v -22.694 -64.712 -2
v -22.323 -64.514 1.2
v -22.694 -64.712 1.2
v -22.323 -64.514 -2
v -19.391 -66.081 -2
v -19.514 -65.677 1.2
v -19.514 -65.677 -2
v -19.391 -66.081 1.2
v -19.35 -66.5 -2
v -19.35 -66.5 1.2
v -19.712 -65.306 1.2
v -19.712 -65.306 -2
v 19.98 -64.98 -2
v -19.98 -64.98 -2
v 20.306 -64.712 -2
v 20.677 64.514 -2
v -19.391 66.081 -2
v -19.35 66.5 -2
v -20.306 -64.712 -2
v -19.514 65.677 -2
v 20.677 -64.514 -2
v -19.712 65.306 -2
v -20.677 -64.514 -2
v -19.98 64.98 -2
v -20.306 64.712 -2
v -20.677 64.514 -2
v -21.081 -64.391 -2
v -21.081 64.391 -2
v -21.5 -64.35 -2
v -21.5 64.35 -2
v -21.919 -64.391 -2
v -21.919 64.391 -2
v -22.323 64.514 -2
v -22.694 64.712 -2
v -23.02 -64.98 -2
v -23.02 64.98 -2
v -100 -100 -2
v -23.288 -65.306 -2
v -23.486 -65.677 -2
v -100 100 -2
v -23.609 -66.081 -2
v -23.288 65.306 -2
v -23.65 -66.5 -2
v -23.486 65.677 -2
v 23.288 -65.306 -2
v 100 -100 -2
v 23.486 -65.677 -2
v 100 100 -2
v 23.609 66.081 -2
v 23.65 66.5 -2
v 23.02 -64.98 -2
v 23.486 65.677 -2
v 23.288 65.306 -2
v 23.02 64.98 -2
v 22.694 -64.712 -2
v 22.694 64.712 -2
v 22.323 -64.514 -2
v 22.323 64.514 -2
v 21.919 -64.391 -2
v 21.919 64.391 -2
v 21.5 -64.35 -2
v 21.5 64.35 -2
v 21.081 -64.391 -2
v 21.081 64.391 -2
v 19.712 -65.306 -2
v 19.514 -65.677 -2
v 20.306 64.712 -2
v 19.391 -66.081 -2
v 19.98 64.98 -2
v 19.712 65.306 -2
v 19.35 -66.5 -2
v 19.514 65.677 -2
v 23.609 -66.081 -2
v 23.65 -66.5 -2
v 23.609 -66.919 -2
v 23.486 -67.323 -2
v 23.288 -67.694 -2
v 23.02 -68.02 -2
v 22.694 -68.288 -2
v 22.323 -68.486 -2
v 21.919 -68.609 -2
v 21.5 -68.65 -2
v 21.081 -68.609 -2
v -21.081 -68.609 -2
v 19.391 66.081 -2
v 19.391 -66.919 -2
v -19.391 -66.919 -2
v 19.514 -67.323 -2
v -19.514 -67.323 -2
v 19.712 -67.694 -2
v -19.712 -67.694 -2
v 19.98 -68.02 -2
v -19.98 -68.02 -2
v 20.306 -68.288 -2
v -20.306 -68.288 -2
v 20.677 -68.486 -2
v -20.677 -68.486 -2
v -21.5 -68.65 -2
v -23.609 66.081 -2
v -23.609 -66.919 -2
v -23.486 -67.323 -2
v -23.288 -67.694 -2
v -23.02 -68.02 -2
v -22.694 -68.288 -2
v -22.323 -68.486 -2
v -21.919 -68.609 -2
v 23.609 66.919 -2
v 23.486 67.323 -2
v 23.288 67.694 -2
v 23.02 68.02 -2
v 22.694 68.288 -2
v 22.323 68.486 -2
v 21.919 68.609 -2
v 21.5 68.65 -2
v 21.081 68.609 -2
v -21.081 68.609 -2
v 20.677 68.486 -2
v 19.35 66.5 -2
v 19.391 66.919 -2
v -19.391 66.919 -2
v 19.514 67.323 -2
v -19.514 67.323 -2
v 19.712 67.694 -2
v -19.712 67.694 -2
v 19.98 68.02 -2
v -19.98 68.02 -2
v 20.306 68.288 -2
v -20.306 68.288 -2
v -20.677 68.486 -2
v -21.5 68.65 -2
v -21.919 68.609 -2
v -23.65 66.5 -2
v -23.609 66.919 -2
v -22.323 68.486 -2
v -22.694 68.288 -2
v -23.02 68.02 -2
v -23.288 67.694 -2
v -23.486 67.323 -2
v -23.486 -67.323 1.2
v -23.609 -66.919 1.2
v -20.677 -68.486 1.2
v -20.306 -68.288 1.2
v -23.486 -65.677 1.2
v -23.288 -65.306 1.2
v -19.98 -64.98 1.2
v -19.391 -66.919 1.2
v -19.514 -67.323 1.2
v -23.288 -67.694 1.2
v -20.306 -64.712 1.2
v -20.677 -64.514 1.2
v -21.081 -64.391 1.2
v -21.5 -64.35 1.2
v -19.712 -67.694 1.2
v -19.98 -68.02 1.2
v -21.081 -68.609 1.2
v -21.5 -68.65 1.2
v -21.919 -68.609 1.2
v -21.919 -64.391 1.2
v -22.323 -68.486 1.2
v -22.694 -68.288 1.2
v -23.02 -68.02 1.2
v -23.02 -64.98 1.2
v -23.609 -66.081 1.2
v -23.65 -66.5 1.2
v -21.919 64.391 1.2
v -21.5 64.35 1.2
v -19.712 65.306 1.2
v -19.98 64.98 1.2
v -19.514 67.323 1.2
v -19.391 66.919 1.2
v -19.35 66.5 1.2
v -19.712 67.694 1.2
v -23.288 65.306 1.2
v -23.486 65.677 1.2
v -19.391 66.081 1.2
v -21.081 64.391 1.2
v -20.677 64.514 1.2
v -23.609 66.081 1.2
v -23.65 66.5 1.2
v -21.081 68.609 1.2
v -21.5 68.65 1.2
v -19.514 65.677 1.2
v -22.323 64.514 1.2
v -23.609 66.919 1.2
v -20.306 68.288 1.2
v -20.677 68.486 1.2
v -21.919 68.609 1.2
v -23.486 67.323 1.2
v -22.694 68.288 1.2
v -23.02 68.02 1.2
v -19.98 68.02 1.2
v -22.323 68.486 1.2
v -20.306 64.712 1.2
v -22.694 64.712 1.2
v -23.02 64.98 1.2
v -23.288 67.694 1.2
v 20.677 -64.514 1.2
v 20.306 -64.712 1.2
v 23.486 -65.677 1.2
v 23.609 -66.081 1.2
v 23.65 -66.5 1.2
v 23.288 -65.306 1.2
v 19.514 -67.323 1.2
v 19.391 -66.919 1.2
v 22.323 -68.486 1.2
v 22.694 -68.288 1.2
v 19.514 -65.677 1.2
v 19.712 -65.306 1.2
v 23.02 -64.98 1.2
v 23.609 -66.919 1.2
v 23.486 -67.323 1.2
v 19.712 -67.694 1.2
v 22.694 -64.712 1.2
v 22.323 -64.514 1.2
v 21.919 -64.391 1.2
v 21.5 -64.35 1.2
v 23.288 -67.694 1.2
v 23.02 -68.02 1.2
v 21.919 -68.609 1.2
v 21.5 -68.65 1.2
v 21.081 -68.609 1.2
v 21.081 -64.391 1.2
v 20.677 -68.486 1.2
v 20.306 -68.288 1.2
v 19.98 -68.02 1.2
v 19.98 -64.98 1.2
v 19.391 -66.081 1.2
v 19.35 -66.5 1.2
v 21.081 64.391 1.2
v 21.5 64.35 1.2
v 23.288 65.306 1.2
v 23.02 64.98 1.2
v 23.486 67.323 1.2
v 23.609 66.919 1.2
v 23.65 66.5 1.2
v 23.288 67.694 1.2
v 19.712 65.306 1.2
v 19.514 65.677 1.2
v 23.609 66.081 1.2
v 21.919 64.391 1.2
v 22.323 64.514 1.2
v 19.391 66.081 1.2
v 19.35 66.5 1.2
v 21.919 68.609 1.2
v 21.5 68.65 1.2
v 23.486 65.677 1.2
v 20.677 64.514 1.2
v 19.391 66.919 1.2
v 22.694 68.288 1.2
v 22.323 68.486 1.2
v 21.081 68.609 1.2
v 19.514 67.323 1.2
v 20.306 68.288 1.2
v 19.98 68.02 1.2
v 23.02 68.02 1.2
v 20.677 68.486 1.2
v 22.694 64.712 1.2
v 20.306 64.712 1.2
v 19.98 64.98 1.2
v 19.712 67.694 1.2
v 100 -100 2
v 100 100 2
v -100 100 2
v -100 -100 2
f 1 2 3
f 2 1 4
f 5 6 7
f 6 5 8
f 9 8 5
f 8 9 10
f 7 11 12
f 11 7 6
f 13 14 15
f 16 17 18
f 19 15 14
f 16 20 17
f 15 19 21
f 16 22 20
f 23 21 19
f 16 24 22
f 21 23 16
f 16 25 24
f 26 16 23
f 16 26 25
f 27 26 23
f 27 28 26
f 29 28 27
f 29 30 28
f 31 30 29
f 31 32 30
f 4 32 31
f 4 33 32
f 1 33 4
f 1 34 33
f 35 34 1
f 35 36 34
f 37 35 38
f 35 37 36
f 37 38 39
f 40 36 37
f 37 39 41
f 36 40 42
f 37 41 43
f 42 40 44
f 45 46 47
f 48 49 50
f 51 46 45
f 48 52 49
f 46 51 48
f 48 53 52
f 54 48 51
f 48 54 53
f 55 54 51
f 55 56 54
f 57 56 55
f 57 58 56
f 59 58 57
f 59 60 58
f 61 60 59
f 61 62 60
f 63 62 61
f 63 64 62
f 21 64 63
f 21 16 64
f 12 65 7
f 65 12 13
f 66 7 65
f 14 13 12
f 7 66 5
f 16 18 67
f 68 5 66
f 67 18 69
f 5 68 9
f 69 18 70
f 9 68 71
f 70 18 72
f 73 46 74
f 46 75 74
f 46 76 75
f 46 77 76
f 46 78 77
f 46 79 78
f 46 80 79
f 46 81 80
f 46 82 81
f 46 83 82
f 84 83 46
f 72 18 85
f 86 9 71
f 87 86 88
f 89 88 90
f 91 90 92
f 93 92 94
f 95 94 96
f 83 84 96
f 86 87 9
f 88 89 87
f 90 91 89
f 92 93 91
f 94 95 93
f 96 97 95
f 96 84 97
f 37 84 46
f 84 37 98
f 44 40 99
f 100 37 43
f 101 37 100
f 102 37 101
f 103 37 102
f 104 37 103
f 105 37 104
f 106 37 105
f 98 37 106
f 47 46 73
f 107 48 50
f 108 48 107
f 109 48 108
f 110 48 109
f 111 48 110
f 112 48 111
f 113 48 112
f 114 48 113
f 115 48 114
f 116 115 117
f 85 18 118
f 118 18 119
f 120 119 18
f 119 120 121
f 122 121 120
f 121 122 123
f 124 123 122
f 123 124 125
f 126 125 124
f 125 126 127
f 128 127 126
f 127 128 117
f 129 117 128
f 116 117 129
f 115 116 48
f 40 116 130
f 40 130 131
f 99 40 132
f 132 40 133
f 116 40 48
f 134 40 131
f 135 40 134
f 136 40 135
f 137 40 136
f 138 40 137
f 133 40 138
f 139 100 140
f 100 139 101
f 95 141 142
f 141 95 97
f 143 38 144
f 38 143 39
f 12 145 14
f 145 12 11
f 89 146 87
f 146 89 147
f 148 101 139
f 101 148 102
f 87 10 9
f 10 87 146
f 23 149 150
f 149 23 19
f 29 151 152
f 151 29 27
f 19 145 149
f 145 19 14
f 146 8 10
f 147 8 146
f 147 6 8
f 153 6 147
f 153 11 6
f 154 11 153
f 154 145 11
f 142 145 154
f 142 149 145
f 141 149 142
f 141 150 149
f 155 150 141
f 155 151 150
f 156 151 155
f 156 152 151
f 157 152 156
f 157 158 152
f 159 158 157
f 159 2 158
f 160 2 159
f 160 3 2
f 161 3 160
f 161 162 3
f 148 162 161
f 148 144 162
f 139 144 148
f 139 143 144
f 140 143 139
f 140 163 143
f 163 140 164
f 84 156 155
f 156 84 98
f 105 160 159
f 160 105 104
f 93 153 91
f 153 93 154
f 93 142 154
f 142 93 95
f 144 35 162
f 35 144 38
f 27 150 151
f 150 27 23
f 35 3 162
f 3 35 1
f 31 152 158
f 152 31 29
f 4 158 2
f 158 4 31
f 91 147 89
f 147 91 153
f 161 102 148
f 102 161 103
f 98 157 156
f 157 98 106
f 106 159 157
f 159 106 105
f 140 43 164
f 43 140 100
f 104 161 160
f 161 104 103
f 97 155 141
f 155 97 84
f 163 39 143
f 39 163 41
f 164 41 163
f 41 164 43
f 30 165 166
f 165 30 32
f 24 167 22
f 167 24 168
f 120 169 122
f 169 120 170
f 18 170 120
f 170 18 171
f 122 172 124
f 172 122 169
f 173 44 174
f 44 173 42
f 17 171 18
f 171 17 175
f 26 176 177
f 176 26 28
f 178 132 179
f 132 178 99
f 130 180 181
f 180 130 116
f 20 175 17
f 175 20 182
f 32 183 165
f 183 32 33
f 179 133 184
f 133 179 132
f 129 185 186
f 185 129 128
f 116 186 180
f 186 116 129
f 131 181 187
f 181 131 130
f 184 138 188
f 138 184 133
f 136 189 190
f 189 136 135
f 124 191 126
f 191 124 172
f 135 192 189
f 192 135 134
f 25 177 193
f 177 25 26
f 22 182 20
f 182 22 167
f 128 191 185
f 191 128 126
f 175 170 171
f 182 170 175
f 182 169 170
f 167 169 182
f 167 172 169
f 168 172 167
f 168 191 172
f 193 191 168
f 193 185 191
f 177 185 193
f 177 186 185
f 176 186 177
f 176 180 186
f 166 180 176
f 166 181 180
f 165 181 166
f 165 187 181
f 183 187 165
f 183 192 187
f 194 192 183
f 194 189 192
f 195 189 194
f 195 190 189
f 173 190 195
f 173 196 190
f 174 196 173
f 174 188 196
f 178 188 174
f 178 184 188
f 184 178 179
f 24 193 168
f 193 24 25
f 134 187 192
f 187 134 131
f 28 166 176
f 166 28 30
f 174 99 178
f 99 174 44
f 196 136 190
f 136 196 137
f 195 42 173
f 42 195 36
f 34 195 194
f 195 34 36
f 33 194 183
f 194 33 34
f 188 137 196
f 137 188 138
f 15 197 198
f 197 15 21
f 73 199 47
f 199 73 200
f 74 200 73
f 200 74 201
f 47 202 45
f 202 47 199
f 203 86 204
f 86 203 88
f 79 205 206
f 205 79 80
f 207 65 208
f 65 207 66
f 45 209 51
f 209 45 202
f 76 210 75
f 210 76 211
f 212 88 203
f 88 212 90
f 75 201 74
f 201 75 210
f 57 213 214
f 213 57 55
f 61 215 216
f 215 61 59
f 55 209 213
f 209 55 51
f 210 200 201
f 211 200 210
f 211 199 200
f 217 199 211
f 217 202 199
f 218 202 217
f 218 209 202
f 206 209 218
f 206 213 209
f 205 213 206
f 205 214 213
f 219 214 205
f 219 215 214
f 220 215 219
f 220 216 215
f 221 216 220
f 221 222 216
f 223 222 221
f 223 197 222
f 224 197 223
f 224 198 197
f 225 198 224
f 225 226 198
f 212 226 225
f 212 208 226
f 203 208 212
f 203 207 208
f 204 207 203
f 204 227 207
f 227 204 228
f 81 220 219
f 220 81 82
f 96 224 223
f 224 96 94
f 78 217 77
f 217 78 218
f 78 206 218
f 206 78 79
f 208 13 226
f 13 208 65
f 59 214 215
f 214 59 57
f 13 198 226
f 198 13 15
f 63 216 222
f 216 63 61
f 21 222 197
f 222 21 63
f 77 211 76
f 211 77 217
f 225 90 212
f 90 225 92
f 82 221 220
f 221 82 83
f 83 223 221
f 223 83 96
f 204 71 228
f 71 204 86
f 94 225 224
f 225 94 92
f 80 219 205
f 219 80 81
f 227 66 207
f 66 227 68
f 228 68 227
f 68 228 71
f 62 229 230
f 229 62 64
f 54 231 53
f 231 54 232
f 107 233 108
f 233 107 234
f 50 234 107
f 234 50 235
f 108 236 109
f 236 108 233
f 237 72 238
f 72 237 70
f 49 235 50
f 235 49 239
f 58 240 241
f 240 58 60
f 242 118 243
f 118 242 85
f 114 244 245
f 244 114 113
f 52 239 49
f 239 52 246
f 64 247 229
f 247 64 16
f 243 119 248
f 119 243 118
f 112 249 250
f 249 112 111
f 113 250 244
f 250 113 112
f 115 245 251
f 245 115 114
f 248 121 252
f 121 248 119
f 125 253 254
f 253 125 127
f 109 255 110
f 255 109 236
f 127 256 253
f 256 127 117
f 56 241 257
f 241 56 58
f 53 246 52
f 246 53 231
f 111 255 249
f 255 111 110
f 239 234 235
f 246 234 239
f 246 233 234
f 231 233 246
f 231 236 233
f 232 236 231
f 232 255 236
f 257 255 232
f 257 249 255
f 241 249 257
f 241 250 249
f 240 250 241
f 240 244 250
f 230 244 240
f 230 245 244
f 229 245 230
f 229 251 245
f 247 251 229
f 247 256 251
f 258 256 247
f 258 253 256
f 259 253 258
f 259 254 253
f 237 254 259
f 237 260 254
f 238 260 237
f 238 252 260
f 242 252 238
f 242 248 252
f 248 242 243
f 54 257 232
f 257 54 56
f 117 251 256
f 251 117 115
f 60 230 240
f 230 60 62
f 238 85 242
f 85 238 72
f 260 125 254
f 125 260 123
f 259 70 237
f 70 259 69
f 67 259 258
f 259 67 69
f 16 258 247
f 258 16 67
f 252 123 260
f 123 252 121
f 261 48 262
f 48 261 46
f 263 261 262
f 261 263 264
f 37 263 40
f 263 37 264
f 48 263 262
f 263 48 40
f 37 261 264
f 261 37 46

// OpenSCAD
// file: params.scad
// ── Shared parameters for card track system ──────────────────────────────────

// 608ZZ skateboard bearing
bearing_od = 22;
bearing_id = 8;
bearing_w  = 7;

// Track section
track_sec_len = 200;   // length of one straight section
track_floor_t = 4;     // floor thickness

// Cart body width — defined here early because rail spacing depends on it
cart_body_w  = 50;

// Bearing groove rails — two narrow U-channels (one per bearing) replace the
// single large U-channel.  Each groove captures one 608ZZ bearing laterally;
// the floor carries vertical load.  No outer containment walls needed.
//
//  Cross-section view (one groove):
//
//    ┌─┐         ┌─┐
//    │ │  O OOO  │ │   ← 608ZZ bearing (22 mm OD) riding in groove
//    └─┴─────────┴─┘
//    ←t→← ch_w →←t→
//
rail_ch_w      = 8.0;   // inner groove width — bearing_w (7 mm) + 1 mm clearance
rail_ch_wall_t = 3.5;   // groove wall thickness each side
rail_ch_wall_h = 6.0;   // groove wall height above floor

// Bearing centre X positions, gap geometry, and total track width.
post_shoulder = 1.5;   // axial gap between body face and bearing inner race
bear_cx_L     = rail_ch_wall_t + rail_ch_w / 2;
bear_cx_R     = bear_cx_L + cart_body_w + 2 * (post_shoulder + bearing_w / 2);
track_total_w = bear_cx_R + rail_ch_w / 2 + rail_ch_wall_t;

// Inner faces of the gap between the two rails
gap_inner_L = bear_cx_L + rail_ch_w / 2 + rail_ch_wall_t;
gap_inner_R = bear_cx_R - rail_ch_w / 2 - rail_ch_wall_t;
gap_w       = gap_inner_R - gap_inner_L;

// Track end connectors — puzzle-piece tabs flush with the track floor.
// Tabs extrude from the end face at Z=0, spanning the full floor thickness
// (track_floor_t).  Sockets are through-holes cut from Z=0 to Z=track_floor_t
// in the end-section floor — open top and bottom, so no supports are needed
// when printing flat.  Bottom face of every track section is perfectly flat.
//
//  Side view at end face (track lying on table):
//
//    ════════════════════════  ← track walls (Z = 0 to track_total_h)
//    ┌──────────────────────┐  ← floor (Z = 0 to track_floor_t)
//    │  [socket] [socket]   │  ← through-holes in floor
//    └──────────────────────┘  ← bottom face at Z = 0 (flat)
//
//  +Y end face: tabs protrude beyond end face, spanning Z = 0..track_floor_t
//  -Y end face: sockets are through-holes in the end-section floor

tab_neck_w   = 12;           // neck width
tab_neck_l   = 8;            // neck length (protrusion from end face)
tab_knob_d   = 22;           // knob diameter — wider than neck, creates interlock
tab_clr      = 1.0;          // total clearance on width/diameter (0.5 mm per side)

conn_pad_w   = tab_knob_d + 6;                  // 28 mm — connector cross-section width
conn_pad_len = tab_neck_l + tab_knob_d / 2 + 4; // 23 mm — floor depth / tab reach

// X centre of the single round connector — centred in the gap between the two rails.
bot_conn_x = track_total_w / 2;

// Cart
cart_plate   = 200;    // 200 × 200 mm top plate
plate_t      = 4;      // plate thickness (thicker to give pegs something to grip)
// cart_body_w defined above (rail spacing depends on it)
cart_body_h  = 22;     // height of cart body — reduced 4 mm from original 26 mm
wheelbase    = 120;    // front-to-rear axle spacing
cart_body_len = wheelbase + 20;  // 140 mm front-to-rear
cart_wall_t   = 7;               // hollow cart body wall thickness (all four sides)

// Alignment pegs (body → plate)
// Pegs sit at the 4 solid corners of the body top face, outside the lightening pocket.
// Plate holes are blind — open from the bottom face only, leaving a solid top skin.
// Peg height is set equal to hole depth so pegs are fully captured and flush at the top.
peg_d         = 4.0;   // peg cylinder diameter
peg_hole_depth = 3.2;  // blind hole depth — leaves 0.8 mm skin at plate top face
peg_h         = 3.0;   // peg height — 0.2 mm shorter than hole so it seats fully
hole_d        = 4.3;   // plate hole diameter (0.3 mm clearance — easy slide, glue fills gap)

// Stub-axle posts (bearing friction-fit over post)
post_d       = 8.2;   // 0.2 mm press-fit onto 608ZZ bore (8 mm)
// post breakdown: 1.5 mm shoulder gap + 7 mm bearing + 1.5 mm retention nose = 10 mm
post_len     = 10;
// post centre sits 9 mm above cart body bottom face:
//   bearing centre = 11 mm above track floor  (= bearing_od/2)
//   cart body bottom clears floor by 2 mm      (= 11 - 9)
post_z       = 9;

// Circular relief cut into the body side face at each post base.
// Prevents the bearing outer race from rubbing against the body during spin.
bearing_relief_d     = bearing_od + 4;   // 26 mm diameter
bearing_relief_depth = 1.5;              // axial depth of relief pocket

// Corner
corner_inner_r = 100;  // inner radius of corner track centre-line
// main file
include <params.scad>

// ── Cart top plate — print this piece ─────────────────────────────────────────
// 200 × 200 mm flat plate with 4 blind holes for alignment pegs.
// Print flat on bed — no supports needed.
//
// Blind holes open from the bottom face only; the top skin stays solid.
// Peg height (3 mm) is slightly less than hole depth (3.2 mm) so pegs seat fully
// without bottoming out, and the top surface of the plate remains clean and flat.

// Peg positions — must match cart_bottom.scad exactly.
peg_x = cart_body_w  / 2 - cart_wall_t / 2;   // 21.5 mm — mid-wall position
peg_y = cart_body_len / 2 - cart_wall_t / 2;  // 66.5 mm — mid-wall position

difference() {
    // Plate centred on X=0, Y=0
    cube([cart_plate, cart_plate, plate_t], center = true);

    // Blind holes for alignment pegs — open from bottom face, peg_hole_depth deep
    for (sx = [-1, 1], sy = [-1, 1])
        translate([sx * peg_x, sy * peg_y, -plate_t / 2])
            cylinder(d = hole_d, h = peg_hole_depth, $fn = 32);
}
